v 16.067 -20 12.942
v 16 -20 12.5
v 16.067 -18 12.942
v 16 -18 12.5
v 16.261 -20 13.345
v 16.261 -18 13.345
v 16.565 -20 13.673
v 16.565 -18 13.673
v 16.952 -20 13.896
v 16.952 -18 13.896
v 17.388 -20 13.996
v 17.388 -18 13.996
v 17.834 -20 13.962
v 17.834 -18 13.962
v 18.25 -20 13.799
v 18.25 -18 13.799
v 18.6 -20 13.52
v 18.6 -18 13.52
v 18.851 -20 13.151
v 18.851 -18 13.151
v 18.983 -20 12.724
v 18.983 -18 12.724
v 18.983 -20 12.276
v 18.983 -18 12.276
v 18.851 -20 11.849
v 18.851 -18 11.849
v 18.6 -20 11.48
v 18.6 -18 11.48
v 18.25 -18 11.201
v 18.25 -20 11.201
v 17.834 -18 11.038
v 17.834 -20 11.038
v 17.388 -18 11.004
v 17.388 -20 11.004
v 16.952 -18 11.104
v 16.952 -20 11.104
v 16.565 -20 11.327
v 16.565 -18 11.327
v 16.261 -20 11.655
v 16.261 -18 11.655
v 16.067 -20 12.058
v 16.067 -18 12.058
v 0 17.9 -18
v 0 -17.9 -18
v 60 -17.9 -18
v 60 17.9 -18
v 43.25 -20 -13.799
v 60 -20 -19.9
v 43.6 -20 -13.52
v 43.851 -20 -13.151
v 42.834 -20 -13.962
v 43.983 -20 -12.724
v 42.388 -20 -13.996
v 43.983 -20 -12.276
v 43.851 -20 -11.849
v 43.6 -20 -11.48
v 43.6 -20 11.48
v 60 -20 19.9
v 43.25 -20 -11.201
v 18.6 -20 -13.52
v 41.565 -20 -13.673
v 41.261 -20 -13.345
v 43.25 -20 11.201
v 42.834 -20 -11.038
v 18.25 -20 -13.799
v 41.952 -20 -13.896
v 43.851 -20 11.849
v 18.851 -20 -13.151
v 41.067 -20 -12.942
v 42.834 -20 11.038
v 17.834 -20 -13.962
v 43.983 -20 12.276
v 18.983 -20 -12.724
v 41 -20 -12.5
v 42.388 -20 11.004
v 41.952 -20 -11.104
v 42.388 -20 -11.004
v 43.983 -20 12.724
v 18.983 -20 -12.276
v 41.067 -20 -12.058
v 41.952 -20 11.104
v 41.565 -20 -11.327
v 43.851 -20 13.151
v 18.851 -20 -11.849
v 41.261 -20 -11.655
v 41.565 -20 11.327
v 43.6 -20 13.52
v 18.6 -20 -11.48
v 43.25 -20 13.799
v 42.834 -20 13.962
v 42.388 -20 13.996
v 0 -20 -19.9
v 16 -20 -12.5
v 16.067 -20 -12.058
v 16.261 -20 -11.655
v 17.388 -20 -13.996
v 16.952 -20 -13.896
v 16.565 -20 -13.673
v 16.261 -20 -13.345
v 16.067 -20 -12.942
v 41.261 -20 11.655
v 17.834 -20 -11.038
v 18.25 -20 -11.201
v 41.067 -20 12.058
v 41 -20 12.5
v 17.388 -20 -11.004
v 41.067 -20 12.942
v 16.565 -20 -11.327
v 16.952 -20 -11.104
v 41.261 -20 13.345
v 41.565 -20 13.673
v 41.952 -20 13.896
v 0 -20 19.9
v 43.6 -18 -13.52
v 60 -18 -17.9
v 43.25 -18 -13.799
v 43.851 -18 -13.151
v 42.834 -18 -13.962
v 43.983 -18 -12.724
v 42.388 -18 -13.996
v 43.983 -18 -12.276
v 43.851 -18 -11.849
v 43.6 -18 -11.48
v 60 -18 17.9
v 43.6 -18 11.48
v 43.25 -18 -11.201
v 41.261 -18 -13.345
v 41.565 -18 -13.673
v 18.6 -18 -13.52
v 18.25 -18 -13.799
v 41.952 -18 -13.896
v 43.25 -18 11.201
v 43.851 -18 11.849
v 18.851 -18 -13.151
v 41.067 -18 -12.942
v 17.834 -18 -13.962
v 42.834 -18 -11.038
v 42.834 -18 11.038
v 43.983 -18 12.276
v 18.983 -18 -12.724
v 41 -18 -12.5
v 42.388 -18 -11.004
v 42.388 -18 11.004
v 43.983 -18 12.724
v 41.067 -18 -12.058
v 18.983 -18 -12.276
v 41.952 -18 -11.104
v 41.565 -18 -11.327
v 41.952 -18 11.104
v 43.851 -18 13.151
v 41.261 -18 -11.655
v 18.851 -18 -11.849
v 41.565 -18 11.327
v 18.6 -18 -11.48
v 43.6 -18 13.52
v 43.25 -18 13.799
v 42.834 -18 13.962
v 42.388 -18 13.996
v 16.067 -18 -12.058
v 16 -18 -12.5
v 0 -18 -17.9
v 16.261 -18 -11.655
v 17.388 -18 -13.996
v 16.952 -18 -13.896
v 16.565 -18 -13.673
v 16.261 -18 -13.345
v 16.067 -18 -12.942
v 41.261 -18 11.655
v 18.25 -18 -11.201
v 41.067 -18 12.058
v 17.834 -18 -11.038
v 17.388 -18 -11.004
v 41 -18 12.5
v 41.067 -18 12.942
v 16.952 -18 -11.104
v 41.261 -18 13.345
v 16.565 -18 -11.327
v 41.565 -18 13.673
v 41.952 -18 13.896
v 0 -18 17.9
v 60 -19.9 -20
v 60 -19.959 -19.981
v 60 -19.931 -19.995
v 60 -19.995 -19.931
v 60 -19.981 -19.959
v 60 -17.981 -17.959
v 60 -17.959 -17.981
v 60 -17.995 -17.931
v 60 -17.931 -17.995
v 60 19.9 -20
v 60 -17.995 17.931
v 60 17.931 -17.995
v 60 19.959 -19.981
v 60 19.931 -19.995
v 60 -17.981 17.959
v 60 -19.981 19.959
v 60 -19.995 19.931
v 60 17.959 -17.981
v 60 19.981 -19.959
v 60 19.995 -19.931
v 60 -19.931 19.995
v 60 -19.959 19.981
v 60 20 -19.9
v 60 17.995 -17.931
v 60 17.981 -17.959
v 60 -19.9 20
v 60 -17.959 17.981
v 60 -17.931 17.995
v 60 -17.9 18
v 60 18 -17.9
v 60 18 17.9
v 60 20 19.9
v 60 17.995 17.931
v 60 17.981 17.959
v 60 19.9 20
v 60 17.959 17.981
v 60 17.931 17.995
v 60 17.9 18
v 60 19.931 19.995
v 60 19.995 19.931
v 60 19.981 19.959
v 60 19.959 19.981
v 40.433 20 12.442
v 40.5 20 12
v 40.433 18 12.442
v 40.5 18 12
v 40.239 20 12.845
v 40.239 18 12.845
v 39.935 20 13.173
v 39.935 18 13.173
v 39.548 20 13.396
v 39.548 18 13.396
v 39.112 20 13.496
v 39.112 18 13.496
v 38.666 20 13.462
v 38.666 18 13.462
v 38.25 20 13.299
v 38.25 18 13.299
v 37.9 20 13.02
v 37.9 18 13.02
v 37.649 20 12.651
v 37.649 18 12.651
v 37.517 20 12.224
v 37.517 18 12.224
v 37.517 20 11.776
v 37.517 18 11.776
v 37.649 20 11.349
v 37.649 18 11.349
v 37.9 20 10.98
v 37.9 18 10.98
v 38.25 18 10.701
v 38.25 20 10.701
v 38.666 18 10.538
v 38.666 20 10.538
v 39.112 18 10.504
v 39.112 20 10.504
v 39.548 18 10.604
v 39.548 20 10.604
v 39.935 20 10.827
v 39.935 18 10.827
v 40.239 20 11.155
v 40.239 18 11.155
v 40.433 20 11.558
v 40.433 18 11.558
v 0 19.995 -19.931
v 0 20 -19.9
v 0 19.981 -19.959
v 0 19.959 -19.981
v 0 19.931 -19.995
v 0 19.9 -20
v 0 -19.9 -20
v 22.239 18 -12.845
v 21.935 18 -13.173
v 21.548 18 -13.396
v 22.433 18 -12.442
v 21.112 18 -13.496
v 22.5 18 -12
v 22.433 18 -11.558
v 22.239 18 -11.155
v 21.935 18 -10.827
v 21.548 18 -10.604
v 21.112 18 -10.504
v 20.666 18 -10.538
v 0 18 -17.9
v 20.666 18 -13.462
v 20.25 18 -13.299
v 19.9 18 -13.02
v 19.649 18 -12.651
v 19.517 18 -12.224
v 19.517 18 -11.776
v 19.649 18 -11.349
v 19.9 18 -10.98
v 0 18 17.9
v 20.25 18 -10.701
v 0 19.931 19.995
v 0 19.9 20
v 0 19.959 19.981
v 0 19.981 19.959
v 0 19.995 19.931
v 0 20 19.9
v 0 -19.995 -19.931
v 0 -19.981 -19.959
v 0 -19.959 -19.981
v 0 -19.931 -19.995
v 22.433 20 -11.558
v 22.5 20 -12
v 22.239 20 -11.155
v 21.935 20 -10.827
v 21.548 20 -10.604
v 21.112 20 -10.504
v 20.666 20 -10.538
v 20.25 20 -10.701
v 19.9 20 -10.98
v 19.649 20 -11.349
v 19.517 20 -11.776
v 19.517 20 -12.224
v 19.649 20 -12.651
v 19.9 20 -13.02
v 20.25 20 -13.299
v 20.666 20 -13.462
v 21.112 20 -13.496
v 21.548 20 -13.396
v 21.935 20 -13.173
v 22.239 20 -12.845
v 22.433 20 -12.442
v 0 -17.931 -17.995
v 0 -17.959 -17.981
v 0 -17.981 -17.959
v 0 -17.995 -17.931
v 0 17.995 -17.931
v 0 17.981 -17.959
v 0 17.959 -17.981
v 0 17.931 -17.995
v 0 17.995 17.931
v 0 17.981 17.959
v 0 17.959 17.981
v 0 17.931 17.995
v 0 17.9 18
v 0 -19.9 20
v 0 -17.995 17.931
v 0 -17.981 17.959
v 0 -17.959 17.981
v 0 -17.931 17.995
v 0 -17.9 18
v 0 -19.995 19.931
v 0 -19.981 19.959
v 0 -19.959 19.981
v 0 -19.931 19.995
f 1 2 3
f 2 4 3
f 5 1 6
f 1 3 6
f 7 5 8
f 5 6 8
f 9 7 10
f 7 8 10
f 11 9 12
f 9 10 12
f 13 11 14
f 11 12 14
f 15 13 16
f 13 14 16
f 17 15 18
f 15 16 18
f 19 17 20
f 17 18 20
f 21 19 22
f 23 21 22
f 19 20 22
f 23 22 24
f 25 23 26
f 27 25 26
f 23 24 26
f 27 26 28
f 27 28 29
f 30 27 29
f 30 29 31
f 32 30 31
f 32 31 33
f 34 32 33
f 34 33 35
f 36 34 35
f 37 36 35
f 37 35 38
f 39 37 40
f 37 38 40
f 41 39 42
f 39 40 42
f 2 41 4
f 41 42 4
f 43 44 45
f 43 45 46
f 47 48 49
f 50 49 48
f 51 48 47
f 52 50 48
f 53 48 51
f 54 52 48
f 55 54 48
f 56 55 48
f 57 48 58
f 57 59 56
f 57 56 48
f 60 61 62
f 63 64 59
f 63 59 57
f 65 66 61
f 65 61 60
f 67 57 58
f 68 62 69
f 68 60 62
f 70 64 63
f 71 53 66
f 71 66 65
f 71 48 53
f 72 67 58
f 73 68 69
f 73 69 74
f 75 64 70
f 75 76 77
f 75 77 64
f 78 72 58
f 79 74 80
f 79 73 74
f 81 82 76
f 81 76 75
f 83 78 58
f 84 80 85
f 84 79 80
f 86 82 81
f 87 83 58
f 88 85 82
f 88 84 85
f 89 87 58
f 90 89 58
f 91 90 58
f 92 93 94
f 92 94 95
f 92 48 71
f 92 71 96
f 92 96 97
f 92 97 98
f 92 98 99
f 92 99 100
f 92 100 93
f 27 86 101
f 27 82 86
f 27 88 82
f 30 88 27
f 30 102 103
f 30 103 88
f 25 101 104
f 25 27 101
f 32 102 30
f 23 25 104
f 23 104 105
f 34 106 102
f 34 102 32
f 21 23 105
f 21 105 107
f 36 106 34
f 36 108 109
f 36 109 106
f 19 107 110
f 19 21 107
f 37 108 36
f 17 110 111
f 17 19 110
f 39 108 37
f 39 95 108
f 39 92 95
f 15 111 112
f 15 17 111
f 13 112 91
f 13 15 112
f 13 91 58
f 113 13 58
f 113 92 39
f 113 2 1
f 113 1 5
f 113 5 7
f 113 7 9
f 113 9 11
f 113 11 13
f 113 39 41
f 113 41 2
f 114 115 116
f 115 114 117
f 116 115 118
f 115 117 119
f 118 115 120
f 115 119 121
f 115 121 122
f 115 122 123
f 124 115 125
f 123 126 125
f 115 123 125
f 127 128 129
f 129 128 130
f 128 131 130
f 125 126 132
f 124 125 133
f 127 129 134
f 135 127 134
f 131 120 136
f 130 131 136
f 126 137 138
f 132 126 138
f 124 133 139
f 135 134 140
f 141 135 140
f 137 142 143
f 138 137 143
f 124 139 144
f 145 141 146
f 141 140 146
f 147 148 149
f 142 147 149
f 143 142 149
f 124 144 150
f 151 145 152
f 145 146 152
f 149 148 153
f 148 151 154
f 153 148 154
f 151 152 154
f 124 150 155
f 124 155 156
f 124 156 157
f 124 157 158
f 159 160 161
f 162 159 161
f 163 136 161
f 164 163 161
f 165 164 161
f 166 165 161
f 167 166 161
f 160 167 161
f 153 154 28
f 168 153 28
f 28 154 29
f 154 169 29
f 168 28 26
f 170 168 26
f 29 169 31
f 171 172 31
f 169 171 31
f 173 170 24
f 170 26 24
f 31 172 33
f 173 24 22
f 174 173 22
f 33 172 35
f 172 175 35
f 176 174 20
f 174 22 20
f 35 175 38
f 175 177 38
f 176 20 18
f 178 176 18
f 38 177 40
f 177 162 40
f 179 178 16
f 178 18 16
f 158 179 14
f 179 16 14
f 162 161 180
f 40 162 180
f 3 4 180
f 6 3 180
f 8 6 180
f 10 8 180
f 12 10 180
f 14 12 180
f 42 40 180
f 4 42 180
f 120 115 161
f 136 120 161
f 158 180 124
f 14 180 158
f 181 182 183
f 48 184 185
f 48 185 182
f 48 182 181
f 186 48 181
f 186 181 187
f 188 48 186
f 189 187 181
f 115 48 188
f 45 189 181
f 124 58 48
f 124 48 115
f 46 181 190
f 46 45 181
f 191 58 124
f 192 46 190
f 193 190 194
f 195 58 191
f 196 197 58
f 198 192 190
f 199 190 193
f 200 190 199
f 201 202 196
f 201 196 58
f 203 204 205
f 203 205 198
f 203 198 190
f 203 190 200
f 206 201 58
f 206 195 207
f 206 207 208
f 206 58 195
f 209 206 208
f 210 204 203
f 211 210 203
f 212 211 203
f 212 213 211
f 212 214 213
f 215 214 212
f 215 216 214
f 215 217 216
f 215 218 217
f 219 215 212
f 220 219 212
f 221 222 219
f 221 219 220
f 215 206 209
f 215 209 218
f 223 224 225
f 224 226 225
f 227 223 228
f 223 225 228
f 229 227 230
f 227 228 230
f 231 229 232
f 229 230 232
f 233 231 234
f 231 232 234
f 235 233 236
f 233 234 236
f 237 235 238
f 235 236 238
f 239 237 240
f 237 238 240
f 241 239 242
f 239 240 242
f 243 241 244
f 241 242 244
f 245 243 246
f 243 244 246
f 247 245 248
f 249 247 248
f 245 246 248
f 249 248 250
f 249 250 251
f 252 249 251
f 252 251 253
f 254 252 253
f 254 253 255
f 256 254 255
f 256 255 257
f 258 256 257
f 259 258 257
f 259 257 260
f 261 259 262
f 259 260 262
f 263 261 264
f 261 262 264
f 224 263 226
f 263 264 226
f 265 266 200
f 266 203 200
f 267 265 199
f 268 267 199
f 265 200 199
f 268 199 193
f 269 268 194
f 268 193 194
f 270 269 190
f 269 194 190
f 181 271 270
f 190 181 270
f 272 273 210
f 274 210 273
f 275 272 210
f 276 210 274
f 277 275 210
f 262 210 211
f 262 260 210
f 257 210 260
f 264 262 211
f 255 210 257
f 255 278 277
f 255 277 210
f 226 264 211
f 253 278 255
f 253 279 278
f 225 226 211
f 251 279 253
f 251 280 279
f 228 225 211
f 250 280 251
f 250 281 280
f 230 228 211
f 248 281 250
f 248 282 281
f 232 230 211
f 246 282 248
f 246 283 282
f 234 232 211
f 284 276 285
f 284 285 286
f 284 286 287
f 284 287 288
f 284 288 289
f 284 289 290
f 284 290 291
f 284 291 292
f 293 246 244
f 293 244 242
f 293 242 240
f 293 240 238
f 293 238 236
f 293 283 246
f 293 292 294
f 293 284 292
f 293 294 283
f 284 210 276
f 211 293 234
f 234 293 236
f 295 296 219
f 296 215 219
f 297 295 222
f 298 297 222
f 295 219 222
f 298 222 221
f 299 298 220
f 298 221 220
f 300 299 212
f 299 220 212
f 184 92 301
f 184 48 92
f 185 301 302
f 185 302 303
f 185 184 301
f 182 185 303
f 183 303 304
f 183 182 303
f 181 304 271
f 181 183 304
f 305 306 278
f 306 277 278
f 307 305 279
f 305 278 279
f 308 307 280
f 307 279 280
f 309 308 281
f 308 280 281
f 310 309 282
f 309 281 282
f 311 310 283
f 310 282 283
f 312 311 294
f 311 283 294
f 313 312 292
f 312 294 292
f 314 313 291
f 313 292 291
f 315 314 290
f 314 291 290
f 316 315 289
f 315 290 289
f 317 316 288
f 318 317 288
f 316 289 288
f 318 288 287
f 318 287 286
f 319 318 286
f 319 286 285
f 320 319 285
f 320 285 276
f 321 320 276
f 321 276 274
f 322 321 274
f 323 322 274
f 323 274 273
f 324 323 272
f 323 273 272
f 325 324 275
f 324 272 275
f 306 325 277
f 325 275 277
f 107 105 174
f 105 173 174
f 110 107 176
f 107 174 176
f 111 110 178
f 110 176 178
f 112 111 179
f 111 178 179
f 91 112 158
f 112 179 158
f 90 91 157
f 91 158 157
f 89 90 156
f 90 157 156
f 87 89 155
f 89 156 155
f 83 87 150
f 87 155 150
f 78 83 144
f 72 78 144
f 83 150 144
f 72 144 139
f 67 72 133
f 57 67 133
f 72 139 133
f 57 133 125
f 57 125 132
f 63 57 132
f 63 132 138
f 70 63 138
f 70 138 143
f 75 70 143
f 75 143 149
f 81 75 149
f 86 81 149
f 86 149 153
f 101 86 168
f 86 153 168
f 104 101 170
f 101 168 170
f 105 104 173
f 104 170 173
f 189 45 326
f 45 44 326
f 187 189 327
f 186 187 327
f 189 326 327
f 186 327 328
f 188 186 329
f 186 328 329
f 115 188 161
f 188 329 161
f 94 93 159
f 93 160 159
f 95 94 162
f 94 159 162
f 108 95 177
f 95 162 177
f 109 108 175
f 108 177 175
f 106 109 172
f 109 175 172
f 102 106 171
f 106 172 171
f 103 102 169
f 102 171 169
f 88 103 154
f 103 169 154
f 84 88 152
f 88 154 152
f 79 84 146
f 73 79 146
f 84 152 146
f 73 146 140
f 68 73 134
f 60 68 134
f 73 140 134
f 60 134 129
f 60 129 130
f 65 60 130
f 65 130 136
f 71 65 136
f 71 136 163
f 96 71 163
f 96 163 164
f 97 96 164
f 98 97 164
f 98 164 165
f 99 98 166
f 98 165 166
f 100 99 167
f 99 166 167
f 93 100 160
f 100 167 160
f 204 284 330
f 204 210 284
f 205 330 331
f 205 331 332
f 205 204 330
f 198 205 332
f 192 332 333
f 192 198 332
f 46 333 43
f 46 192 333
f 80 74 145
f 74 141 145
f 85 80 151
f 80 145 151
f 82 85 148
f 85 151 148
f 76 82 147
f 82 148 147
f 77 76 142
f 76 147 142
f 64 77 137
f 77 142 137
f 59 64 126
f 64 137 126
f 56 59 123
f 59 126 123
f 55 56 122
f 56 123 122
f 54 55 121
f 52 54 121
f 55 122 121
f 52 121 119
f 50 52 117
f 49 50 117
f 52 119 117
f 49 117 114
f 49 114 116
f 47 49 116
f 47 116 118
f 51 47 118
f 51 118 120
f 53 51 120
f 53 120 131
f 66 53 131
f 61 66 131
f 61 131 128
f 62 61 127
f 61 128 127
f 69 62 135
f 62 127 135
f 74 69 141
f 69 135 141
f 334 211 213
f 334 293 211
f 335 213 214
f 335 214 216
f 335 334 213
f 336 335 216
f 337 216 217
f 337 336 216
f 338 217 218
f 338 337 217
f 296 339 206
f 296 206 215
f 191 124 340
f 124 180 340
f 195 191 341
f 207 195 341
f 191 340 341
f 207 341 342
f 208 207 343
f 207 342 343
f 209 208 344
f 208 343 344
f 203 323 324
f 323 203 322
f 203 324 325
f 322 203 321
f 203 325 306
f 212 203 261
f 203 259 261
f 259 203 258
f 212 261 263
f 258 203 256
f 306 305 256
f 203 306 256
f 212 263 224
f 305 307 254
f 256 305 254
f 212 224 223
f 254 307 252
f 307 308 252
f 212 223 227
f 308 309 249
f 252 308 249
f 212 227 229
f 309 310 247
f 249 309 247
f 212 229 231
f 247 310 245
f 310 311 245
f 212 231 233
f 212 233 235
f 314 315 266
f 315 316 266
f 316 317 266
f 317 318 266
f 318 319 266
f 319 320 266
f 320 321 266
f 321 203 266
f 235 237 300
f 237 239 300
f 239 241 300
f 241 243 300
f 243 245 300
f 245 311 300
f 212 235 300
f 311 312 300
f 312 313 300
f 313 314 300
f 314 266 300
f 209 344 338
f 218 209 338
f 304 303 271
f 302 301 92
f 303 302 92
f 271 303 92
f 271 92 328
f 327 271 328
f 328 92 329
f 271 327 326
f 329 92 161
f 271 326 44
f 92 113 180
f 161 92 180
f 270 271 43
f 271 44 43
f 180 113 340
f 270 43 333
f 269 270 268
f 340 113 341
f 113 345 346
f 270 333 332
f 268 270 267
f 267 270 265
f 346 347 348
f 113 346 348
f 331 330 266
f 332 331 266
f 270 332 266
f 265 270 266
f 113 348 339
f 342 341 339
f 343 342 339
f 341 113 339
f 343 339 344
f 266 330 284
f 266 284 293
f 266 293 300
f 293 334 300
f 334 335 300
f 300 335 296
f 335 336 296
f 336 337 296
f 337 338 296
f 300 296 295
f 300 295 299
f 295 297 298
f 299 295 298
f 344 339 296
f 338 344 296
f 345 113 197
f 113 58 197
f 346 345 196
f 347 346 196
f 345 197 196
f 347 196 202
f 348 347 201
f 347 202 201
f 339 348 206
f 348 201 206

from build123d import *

# Parameters (mm, degrees)
F0_W     = 40
F0_H     = 40
F1_DEPTH = 60
F2_T     = -2
F4_D     = 3
F4_DEPTH = 2
F4_TIP   = 0.9012909285
F5_R     = 0.1
F6_R     = 0.1
F8_D     = 3
F8_DEPTH = 2
F8_TIP   = 0.9012909285


with BuildPart() as f1:
    # F0 (on Right) → F1 (new body)
    with BuildSketch(Plane.YZ):
        Rectangle(F0_W, F0_H)
    extrude(amount=F1_DEPTH)

    # F2
    f2_openings = [f1.faces().sort_by_distance(p)[0] for p in [
        (60, 0, 0),
        (0, 0, 0),
    ]]
    offset(amount=F2_T, openings=f2_openings)

    # F4
    with Locations(Plane.XZ.offset(20)):
        with Locations((17.5, 12.5), (42.5, 12.5), (42.5, -12.5), (17.5, -12.5)):
            Hole(F4_D / 2, depth=F4_DEPTH)
            with Locations((0, 0, -(F4_DEPTH + F4_TIP / 2))):  # 118° drill point
                Cone(0, F4_D / 2, F4_TIP, mode=Mode.SUBTRACT)

    # F5
    f5_edges = [f1.edges().sort_by_distance(p)[0] for p in [
        (30, -20, 20),
        (30, 20, 20),
        (30, -20, -20),
        (30, 20, -20),
    ]]
    fillet(f5_edges, radius=F5_R)

    # F6
    f6_edges = [f1.edges().sort_by_distance(p)[0] for p in [
        (30, -18, 18),
        (30, 18, 18),
        (30, -18, -18),
        (30, 18, -18),
    ]]
    fillet(f6_edges, radius=F6_R)

    # F8
    with Locations(Plane(origin=(0, 20, 0), x_dir=(-1, 0, 0), z_dir=(0, 1, 0))):
        with Locations((-39, 12), (-21, -12)):
            Hole(F8_D / 2, depth=F8_DEPTH)
            with Locations((0, 0, -(F8_DEPTH + F8_TIP / 2))):  # 118° drill point
                Cone(0, F8_D / 2, F8_TIP, mode=Mode.SUBTRACT)


solid = f1.part
